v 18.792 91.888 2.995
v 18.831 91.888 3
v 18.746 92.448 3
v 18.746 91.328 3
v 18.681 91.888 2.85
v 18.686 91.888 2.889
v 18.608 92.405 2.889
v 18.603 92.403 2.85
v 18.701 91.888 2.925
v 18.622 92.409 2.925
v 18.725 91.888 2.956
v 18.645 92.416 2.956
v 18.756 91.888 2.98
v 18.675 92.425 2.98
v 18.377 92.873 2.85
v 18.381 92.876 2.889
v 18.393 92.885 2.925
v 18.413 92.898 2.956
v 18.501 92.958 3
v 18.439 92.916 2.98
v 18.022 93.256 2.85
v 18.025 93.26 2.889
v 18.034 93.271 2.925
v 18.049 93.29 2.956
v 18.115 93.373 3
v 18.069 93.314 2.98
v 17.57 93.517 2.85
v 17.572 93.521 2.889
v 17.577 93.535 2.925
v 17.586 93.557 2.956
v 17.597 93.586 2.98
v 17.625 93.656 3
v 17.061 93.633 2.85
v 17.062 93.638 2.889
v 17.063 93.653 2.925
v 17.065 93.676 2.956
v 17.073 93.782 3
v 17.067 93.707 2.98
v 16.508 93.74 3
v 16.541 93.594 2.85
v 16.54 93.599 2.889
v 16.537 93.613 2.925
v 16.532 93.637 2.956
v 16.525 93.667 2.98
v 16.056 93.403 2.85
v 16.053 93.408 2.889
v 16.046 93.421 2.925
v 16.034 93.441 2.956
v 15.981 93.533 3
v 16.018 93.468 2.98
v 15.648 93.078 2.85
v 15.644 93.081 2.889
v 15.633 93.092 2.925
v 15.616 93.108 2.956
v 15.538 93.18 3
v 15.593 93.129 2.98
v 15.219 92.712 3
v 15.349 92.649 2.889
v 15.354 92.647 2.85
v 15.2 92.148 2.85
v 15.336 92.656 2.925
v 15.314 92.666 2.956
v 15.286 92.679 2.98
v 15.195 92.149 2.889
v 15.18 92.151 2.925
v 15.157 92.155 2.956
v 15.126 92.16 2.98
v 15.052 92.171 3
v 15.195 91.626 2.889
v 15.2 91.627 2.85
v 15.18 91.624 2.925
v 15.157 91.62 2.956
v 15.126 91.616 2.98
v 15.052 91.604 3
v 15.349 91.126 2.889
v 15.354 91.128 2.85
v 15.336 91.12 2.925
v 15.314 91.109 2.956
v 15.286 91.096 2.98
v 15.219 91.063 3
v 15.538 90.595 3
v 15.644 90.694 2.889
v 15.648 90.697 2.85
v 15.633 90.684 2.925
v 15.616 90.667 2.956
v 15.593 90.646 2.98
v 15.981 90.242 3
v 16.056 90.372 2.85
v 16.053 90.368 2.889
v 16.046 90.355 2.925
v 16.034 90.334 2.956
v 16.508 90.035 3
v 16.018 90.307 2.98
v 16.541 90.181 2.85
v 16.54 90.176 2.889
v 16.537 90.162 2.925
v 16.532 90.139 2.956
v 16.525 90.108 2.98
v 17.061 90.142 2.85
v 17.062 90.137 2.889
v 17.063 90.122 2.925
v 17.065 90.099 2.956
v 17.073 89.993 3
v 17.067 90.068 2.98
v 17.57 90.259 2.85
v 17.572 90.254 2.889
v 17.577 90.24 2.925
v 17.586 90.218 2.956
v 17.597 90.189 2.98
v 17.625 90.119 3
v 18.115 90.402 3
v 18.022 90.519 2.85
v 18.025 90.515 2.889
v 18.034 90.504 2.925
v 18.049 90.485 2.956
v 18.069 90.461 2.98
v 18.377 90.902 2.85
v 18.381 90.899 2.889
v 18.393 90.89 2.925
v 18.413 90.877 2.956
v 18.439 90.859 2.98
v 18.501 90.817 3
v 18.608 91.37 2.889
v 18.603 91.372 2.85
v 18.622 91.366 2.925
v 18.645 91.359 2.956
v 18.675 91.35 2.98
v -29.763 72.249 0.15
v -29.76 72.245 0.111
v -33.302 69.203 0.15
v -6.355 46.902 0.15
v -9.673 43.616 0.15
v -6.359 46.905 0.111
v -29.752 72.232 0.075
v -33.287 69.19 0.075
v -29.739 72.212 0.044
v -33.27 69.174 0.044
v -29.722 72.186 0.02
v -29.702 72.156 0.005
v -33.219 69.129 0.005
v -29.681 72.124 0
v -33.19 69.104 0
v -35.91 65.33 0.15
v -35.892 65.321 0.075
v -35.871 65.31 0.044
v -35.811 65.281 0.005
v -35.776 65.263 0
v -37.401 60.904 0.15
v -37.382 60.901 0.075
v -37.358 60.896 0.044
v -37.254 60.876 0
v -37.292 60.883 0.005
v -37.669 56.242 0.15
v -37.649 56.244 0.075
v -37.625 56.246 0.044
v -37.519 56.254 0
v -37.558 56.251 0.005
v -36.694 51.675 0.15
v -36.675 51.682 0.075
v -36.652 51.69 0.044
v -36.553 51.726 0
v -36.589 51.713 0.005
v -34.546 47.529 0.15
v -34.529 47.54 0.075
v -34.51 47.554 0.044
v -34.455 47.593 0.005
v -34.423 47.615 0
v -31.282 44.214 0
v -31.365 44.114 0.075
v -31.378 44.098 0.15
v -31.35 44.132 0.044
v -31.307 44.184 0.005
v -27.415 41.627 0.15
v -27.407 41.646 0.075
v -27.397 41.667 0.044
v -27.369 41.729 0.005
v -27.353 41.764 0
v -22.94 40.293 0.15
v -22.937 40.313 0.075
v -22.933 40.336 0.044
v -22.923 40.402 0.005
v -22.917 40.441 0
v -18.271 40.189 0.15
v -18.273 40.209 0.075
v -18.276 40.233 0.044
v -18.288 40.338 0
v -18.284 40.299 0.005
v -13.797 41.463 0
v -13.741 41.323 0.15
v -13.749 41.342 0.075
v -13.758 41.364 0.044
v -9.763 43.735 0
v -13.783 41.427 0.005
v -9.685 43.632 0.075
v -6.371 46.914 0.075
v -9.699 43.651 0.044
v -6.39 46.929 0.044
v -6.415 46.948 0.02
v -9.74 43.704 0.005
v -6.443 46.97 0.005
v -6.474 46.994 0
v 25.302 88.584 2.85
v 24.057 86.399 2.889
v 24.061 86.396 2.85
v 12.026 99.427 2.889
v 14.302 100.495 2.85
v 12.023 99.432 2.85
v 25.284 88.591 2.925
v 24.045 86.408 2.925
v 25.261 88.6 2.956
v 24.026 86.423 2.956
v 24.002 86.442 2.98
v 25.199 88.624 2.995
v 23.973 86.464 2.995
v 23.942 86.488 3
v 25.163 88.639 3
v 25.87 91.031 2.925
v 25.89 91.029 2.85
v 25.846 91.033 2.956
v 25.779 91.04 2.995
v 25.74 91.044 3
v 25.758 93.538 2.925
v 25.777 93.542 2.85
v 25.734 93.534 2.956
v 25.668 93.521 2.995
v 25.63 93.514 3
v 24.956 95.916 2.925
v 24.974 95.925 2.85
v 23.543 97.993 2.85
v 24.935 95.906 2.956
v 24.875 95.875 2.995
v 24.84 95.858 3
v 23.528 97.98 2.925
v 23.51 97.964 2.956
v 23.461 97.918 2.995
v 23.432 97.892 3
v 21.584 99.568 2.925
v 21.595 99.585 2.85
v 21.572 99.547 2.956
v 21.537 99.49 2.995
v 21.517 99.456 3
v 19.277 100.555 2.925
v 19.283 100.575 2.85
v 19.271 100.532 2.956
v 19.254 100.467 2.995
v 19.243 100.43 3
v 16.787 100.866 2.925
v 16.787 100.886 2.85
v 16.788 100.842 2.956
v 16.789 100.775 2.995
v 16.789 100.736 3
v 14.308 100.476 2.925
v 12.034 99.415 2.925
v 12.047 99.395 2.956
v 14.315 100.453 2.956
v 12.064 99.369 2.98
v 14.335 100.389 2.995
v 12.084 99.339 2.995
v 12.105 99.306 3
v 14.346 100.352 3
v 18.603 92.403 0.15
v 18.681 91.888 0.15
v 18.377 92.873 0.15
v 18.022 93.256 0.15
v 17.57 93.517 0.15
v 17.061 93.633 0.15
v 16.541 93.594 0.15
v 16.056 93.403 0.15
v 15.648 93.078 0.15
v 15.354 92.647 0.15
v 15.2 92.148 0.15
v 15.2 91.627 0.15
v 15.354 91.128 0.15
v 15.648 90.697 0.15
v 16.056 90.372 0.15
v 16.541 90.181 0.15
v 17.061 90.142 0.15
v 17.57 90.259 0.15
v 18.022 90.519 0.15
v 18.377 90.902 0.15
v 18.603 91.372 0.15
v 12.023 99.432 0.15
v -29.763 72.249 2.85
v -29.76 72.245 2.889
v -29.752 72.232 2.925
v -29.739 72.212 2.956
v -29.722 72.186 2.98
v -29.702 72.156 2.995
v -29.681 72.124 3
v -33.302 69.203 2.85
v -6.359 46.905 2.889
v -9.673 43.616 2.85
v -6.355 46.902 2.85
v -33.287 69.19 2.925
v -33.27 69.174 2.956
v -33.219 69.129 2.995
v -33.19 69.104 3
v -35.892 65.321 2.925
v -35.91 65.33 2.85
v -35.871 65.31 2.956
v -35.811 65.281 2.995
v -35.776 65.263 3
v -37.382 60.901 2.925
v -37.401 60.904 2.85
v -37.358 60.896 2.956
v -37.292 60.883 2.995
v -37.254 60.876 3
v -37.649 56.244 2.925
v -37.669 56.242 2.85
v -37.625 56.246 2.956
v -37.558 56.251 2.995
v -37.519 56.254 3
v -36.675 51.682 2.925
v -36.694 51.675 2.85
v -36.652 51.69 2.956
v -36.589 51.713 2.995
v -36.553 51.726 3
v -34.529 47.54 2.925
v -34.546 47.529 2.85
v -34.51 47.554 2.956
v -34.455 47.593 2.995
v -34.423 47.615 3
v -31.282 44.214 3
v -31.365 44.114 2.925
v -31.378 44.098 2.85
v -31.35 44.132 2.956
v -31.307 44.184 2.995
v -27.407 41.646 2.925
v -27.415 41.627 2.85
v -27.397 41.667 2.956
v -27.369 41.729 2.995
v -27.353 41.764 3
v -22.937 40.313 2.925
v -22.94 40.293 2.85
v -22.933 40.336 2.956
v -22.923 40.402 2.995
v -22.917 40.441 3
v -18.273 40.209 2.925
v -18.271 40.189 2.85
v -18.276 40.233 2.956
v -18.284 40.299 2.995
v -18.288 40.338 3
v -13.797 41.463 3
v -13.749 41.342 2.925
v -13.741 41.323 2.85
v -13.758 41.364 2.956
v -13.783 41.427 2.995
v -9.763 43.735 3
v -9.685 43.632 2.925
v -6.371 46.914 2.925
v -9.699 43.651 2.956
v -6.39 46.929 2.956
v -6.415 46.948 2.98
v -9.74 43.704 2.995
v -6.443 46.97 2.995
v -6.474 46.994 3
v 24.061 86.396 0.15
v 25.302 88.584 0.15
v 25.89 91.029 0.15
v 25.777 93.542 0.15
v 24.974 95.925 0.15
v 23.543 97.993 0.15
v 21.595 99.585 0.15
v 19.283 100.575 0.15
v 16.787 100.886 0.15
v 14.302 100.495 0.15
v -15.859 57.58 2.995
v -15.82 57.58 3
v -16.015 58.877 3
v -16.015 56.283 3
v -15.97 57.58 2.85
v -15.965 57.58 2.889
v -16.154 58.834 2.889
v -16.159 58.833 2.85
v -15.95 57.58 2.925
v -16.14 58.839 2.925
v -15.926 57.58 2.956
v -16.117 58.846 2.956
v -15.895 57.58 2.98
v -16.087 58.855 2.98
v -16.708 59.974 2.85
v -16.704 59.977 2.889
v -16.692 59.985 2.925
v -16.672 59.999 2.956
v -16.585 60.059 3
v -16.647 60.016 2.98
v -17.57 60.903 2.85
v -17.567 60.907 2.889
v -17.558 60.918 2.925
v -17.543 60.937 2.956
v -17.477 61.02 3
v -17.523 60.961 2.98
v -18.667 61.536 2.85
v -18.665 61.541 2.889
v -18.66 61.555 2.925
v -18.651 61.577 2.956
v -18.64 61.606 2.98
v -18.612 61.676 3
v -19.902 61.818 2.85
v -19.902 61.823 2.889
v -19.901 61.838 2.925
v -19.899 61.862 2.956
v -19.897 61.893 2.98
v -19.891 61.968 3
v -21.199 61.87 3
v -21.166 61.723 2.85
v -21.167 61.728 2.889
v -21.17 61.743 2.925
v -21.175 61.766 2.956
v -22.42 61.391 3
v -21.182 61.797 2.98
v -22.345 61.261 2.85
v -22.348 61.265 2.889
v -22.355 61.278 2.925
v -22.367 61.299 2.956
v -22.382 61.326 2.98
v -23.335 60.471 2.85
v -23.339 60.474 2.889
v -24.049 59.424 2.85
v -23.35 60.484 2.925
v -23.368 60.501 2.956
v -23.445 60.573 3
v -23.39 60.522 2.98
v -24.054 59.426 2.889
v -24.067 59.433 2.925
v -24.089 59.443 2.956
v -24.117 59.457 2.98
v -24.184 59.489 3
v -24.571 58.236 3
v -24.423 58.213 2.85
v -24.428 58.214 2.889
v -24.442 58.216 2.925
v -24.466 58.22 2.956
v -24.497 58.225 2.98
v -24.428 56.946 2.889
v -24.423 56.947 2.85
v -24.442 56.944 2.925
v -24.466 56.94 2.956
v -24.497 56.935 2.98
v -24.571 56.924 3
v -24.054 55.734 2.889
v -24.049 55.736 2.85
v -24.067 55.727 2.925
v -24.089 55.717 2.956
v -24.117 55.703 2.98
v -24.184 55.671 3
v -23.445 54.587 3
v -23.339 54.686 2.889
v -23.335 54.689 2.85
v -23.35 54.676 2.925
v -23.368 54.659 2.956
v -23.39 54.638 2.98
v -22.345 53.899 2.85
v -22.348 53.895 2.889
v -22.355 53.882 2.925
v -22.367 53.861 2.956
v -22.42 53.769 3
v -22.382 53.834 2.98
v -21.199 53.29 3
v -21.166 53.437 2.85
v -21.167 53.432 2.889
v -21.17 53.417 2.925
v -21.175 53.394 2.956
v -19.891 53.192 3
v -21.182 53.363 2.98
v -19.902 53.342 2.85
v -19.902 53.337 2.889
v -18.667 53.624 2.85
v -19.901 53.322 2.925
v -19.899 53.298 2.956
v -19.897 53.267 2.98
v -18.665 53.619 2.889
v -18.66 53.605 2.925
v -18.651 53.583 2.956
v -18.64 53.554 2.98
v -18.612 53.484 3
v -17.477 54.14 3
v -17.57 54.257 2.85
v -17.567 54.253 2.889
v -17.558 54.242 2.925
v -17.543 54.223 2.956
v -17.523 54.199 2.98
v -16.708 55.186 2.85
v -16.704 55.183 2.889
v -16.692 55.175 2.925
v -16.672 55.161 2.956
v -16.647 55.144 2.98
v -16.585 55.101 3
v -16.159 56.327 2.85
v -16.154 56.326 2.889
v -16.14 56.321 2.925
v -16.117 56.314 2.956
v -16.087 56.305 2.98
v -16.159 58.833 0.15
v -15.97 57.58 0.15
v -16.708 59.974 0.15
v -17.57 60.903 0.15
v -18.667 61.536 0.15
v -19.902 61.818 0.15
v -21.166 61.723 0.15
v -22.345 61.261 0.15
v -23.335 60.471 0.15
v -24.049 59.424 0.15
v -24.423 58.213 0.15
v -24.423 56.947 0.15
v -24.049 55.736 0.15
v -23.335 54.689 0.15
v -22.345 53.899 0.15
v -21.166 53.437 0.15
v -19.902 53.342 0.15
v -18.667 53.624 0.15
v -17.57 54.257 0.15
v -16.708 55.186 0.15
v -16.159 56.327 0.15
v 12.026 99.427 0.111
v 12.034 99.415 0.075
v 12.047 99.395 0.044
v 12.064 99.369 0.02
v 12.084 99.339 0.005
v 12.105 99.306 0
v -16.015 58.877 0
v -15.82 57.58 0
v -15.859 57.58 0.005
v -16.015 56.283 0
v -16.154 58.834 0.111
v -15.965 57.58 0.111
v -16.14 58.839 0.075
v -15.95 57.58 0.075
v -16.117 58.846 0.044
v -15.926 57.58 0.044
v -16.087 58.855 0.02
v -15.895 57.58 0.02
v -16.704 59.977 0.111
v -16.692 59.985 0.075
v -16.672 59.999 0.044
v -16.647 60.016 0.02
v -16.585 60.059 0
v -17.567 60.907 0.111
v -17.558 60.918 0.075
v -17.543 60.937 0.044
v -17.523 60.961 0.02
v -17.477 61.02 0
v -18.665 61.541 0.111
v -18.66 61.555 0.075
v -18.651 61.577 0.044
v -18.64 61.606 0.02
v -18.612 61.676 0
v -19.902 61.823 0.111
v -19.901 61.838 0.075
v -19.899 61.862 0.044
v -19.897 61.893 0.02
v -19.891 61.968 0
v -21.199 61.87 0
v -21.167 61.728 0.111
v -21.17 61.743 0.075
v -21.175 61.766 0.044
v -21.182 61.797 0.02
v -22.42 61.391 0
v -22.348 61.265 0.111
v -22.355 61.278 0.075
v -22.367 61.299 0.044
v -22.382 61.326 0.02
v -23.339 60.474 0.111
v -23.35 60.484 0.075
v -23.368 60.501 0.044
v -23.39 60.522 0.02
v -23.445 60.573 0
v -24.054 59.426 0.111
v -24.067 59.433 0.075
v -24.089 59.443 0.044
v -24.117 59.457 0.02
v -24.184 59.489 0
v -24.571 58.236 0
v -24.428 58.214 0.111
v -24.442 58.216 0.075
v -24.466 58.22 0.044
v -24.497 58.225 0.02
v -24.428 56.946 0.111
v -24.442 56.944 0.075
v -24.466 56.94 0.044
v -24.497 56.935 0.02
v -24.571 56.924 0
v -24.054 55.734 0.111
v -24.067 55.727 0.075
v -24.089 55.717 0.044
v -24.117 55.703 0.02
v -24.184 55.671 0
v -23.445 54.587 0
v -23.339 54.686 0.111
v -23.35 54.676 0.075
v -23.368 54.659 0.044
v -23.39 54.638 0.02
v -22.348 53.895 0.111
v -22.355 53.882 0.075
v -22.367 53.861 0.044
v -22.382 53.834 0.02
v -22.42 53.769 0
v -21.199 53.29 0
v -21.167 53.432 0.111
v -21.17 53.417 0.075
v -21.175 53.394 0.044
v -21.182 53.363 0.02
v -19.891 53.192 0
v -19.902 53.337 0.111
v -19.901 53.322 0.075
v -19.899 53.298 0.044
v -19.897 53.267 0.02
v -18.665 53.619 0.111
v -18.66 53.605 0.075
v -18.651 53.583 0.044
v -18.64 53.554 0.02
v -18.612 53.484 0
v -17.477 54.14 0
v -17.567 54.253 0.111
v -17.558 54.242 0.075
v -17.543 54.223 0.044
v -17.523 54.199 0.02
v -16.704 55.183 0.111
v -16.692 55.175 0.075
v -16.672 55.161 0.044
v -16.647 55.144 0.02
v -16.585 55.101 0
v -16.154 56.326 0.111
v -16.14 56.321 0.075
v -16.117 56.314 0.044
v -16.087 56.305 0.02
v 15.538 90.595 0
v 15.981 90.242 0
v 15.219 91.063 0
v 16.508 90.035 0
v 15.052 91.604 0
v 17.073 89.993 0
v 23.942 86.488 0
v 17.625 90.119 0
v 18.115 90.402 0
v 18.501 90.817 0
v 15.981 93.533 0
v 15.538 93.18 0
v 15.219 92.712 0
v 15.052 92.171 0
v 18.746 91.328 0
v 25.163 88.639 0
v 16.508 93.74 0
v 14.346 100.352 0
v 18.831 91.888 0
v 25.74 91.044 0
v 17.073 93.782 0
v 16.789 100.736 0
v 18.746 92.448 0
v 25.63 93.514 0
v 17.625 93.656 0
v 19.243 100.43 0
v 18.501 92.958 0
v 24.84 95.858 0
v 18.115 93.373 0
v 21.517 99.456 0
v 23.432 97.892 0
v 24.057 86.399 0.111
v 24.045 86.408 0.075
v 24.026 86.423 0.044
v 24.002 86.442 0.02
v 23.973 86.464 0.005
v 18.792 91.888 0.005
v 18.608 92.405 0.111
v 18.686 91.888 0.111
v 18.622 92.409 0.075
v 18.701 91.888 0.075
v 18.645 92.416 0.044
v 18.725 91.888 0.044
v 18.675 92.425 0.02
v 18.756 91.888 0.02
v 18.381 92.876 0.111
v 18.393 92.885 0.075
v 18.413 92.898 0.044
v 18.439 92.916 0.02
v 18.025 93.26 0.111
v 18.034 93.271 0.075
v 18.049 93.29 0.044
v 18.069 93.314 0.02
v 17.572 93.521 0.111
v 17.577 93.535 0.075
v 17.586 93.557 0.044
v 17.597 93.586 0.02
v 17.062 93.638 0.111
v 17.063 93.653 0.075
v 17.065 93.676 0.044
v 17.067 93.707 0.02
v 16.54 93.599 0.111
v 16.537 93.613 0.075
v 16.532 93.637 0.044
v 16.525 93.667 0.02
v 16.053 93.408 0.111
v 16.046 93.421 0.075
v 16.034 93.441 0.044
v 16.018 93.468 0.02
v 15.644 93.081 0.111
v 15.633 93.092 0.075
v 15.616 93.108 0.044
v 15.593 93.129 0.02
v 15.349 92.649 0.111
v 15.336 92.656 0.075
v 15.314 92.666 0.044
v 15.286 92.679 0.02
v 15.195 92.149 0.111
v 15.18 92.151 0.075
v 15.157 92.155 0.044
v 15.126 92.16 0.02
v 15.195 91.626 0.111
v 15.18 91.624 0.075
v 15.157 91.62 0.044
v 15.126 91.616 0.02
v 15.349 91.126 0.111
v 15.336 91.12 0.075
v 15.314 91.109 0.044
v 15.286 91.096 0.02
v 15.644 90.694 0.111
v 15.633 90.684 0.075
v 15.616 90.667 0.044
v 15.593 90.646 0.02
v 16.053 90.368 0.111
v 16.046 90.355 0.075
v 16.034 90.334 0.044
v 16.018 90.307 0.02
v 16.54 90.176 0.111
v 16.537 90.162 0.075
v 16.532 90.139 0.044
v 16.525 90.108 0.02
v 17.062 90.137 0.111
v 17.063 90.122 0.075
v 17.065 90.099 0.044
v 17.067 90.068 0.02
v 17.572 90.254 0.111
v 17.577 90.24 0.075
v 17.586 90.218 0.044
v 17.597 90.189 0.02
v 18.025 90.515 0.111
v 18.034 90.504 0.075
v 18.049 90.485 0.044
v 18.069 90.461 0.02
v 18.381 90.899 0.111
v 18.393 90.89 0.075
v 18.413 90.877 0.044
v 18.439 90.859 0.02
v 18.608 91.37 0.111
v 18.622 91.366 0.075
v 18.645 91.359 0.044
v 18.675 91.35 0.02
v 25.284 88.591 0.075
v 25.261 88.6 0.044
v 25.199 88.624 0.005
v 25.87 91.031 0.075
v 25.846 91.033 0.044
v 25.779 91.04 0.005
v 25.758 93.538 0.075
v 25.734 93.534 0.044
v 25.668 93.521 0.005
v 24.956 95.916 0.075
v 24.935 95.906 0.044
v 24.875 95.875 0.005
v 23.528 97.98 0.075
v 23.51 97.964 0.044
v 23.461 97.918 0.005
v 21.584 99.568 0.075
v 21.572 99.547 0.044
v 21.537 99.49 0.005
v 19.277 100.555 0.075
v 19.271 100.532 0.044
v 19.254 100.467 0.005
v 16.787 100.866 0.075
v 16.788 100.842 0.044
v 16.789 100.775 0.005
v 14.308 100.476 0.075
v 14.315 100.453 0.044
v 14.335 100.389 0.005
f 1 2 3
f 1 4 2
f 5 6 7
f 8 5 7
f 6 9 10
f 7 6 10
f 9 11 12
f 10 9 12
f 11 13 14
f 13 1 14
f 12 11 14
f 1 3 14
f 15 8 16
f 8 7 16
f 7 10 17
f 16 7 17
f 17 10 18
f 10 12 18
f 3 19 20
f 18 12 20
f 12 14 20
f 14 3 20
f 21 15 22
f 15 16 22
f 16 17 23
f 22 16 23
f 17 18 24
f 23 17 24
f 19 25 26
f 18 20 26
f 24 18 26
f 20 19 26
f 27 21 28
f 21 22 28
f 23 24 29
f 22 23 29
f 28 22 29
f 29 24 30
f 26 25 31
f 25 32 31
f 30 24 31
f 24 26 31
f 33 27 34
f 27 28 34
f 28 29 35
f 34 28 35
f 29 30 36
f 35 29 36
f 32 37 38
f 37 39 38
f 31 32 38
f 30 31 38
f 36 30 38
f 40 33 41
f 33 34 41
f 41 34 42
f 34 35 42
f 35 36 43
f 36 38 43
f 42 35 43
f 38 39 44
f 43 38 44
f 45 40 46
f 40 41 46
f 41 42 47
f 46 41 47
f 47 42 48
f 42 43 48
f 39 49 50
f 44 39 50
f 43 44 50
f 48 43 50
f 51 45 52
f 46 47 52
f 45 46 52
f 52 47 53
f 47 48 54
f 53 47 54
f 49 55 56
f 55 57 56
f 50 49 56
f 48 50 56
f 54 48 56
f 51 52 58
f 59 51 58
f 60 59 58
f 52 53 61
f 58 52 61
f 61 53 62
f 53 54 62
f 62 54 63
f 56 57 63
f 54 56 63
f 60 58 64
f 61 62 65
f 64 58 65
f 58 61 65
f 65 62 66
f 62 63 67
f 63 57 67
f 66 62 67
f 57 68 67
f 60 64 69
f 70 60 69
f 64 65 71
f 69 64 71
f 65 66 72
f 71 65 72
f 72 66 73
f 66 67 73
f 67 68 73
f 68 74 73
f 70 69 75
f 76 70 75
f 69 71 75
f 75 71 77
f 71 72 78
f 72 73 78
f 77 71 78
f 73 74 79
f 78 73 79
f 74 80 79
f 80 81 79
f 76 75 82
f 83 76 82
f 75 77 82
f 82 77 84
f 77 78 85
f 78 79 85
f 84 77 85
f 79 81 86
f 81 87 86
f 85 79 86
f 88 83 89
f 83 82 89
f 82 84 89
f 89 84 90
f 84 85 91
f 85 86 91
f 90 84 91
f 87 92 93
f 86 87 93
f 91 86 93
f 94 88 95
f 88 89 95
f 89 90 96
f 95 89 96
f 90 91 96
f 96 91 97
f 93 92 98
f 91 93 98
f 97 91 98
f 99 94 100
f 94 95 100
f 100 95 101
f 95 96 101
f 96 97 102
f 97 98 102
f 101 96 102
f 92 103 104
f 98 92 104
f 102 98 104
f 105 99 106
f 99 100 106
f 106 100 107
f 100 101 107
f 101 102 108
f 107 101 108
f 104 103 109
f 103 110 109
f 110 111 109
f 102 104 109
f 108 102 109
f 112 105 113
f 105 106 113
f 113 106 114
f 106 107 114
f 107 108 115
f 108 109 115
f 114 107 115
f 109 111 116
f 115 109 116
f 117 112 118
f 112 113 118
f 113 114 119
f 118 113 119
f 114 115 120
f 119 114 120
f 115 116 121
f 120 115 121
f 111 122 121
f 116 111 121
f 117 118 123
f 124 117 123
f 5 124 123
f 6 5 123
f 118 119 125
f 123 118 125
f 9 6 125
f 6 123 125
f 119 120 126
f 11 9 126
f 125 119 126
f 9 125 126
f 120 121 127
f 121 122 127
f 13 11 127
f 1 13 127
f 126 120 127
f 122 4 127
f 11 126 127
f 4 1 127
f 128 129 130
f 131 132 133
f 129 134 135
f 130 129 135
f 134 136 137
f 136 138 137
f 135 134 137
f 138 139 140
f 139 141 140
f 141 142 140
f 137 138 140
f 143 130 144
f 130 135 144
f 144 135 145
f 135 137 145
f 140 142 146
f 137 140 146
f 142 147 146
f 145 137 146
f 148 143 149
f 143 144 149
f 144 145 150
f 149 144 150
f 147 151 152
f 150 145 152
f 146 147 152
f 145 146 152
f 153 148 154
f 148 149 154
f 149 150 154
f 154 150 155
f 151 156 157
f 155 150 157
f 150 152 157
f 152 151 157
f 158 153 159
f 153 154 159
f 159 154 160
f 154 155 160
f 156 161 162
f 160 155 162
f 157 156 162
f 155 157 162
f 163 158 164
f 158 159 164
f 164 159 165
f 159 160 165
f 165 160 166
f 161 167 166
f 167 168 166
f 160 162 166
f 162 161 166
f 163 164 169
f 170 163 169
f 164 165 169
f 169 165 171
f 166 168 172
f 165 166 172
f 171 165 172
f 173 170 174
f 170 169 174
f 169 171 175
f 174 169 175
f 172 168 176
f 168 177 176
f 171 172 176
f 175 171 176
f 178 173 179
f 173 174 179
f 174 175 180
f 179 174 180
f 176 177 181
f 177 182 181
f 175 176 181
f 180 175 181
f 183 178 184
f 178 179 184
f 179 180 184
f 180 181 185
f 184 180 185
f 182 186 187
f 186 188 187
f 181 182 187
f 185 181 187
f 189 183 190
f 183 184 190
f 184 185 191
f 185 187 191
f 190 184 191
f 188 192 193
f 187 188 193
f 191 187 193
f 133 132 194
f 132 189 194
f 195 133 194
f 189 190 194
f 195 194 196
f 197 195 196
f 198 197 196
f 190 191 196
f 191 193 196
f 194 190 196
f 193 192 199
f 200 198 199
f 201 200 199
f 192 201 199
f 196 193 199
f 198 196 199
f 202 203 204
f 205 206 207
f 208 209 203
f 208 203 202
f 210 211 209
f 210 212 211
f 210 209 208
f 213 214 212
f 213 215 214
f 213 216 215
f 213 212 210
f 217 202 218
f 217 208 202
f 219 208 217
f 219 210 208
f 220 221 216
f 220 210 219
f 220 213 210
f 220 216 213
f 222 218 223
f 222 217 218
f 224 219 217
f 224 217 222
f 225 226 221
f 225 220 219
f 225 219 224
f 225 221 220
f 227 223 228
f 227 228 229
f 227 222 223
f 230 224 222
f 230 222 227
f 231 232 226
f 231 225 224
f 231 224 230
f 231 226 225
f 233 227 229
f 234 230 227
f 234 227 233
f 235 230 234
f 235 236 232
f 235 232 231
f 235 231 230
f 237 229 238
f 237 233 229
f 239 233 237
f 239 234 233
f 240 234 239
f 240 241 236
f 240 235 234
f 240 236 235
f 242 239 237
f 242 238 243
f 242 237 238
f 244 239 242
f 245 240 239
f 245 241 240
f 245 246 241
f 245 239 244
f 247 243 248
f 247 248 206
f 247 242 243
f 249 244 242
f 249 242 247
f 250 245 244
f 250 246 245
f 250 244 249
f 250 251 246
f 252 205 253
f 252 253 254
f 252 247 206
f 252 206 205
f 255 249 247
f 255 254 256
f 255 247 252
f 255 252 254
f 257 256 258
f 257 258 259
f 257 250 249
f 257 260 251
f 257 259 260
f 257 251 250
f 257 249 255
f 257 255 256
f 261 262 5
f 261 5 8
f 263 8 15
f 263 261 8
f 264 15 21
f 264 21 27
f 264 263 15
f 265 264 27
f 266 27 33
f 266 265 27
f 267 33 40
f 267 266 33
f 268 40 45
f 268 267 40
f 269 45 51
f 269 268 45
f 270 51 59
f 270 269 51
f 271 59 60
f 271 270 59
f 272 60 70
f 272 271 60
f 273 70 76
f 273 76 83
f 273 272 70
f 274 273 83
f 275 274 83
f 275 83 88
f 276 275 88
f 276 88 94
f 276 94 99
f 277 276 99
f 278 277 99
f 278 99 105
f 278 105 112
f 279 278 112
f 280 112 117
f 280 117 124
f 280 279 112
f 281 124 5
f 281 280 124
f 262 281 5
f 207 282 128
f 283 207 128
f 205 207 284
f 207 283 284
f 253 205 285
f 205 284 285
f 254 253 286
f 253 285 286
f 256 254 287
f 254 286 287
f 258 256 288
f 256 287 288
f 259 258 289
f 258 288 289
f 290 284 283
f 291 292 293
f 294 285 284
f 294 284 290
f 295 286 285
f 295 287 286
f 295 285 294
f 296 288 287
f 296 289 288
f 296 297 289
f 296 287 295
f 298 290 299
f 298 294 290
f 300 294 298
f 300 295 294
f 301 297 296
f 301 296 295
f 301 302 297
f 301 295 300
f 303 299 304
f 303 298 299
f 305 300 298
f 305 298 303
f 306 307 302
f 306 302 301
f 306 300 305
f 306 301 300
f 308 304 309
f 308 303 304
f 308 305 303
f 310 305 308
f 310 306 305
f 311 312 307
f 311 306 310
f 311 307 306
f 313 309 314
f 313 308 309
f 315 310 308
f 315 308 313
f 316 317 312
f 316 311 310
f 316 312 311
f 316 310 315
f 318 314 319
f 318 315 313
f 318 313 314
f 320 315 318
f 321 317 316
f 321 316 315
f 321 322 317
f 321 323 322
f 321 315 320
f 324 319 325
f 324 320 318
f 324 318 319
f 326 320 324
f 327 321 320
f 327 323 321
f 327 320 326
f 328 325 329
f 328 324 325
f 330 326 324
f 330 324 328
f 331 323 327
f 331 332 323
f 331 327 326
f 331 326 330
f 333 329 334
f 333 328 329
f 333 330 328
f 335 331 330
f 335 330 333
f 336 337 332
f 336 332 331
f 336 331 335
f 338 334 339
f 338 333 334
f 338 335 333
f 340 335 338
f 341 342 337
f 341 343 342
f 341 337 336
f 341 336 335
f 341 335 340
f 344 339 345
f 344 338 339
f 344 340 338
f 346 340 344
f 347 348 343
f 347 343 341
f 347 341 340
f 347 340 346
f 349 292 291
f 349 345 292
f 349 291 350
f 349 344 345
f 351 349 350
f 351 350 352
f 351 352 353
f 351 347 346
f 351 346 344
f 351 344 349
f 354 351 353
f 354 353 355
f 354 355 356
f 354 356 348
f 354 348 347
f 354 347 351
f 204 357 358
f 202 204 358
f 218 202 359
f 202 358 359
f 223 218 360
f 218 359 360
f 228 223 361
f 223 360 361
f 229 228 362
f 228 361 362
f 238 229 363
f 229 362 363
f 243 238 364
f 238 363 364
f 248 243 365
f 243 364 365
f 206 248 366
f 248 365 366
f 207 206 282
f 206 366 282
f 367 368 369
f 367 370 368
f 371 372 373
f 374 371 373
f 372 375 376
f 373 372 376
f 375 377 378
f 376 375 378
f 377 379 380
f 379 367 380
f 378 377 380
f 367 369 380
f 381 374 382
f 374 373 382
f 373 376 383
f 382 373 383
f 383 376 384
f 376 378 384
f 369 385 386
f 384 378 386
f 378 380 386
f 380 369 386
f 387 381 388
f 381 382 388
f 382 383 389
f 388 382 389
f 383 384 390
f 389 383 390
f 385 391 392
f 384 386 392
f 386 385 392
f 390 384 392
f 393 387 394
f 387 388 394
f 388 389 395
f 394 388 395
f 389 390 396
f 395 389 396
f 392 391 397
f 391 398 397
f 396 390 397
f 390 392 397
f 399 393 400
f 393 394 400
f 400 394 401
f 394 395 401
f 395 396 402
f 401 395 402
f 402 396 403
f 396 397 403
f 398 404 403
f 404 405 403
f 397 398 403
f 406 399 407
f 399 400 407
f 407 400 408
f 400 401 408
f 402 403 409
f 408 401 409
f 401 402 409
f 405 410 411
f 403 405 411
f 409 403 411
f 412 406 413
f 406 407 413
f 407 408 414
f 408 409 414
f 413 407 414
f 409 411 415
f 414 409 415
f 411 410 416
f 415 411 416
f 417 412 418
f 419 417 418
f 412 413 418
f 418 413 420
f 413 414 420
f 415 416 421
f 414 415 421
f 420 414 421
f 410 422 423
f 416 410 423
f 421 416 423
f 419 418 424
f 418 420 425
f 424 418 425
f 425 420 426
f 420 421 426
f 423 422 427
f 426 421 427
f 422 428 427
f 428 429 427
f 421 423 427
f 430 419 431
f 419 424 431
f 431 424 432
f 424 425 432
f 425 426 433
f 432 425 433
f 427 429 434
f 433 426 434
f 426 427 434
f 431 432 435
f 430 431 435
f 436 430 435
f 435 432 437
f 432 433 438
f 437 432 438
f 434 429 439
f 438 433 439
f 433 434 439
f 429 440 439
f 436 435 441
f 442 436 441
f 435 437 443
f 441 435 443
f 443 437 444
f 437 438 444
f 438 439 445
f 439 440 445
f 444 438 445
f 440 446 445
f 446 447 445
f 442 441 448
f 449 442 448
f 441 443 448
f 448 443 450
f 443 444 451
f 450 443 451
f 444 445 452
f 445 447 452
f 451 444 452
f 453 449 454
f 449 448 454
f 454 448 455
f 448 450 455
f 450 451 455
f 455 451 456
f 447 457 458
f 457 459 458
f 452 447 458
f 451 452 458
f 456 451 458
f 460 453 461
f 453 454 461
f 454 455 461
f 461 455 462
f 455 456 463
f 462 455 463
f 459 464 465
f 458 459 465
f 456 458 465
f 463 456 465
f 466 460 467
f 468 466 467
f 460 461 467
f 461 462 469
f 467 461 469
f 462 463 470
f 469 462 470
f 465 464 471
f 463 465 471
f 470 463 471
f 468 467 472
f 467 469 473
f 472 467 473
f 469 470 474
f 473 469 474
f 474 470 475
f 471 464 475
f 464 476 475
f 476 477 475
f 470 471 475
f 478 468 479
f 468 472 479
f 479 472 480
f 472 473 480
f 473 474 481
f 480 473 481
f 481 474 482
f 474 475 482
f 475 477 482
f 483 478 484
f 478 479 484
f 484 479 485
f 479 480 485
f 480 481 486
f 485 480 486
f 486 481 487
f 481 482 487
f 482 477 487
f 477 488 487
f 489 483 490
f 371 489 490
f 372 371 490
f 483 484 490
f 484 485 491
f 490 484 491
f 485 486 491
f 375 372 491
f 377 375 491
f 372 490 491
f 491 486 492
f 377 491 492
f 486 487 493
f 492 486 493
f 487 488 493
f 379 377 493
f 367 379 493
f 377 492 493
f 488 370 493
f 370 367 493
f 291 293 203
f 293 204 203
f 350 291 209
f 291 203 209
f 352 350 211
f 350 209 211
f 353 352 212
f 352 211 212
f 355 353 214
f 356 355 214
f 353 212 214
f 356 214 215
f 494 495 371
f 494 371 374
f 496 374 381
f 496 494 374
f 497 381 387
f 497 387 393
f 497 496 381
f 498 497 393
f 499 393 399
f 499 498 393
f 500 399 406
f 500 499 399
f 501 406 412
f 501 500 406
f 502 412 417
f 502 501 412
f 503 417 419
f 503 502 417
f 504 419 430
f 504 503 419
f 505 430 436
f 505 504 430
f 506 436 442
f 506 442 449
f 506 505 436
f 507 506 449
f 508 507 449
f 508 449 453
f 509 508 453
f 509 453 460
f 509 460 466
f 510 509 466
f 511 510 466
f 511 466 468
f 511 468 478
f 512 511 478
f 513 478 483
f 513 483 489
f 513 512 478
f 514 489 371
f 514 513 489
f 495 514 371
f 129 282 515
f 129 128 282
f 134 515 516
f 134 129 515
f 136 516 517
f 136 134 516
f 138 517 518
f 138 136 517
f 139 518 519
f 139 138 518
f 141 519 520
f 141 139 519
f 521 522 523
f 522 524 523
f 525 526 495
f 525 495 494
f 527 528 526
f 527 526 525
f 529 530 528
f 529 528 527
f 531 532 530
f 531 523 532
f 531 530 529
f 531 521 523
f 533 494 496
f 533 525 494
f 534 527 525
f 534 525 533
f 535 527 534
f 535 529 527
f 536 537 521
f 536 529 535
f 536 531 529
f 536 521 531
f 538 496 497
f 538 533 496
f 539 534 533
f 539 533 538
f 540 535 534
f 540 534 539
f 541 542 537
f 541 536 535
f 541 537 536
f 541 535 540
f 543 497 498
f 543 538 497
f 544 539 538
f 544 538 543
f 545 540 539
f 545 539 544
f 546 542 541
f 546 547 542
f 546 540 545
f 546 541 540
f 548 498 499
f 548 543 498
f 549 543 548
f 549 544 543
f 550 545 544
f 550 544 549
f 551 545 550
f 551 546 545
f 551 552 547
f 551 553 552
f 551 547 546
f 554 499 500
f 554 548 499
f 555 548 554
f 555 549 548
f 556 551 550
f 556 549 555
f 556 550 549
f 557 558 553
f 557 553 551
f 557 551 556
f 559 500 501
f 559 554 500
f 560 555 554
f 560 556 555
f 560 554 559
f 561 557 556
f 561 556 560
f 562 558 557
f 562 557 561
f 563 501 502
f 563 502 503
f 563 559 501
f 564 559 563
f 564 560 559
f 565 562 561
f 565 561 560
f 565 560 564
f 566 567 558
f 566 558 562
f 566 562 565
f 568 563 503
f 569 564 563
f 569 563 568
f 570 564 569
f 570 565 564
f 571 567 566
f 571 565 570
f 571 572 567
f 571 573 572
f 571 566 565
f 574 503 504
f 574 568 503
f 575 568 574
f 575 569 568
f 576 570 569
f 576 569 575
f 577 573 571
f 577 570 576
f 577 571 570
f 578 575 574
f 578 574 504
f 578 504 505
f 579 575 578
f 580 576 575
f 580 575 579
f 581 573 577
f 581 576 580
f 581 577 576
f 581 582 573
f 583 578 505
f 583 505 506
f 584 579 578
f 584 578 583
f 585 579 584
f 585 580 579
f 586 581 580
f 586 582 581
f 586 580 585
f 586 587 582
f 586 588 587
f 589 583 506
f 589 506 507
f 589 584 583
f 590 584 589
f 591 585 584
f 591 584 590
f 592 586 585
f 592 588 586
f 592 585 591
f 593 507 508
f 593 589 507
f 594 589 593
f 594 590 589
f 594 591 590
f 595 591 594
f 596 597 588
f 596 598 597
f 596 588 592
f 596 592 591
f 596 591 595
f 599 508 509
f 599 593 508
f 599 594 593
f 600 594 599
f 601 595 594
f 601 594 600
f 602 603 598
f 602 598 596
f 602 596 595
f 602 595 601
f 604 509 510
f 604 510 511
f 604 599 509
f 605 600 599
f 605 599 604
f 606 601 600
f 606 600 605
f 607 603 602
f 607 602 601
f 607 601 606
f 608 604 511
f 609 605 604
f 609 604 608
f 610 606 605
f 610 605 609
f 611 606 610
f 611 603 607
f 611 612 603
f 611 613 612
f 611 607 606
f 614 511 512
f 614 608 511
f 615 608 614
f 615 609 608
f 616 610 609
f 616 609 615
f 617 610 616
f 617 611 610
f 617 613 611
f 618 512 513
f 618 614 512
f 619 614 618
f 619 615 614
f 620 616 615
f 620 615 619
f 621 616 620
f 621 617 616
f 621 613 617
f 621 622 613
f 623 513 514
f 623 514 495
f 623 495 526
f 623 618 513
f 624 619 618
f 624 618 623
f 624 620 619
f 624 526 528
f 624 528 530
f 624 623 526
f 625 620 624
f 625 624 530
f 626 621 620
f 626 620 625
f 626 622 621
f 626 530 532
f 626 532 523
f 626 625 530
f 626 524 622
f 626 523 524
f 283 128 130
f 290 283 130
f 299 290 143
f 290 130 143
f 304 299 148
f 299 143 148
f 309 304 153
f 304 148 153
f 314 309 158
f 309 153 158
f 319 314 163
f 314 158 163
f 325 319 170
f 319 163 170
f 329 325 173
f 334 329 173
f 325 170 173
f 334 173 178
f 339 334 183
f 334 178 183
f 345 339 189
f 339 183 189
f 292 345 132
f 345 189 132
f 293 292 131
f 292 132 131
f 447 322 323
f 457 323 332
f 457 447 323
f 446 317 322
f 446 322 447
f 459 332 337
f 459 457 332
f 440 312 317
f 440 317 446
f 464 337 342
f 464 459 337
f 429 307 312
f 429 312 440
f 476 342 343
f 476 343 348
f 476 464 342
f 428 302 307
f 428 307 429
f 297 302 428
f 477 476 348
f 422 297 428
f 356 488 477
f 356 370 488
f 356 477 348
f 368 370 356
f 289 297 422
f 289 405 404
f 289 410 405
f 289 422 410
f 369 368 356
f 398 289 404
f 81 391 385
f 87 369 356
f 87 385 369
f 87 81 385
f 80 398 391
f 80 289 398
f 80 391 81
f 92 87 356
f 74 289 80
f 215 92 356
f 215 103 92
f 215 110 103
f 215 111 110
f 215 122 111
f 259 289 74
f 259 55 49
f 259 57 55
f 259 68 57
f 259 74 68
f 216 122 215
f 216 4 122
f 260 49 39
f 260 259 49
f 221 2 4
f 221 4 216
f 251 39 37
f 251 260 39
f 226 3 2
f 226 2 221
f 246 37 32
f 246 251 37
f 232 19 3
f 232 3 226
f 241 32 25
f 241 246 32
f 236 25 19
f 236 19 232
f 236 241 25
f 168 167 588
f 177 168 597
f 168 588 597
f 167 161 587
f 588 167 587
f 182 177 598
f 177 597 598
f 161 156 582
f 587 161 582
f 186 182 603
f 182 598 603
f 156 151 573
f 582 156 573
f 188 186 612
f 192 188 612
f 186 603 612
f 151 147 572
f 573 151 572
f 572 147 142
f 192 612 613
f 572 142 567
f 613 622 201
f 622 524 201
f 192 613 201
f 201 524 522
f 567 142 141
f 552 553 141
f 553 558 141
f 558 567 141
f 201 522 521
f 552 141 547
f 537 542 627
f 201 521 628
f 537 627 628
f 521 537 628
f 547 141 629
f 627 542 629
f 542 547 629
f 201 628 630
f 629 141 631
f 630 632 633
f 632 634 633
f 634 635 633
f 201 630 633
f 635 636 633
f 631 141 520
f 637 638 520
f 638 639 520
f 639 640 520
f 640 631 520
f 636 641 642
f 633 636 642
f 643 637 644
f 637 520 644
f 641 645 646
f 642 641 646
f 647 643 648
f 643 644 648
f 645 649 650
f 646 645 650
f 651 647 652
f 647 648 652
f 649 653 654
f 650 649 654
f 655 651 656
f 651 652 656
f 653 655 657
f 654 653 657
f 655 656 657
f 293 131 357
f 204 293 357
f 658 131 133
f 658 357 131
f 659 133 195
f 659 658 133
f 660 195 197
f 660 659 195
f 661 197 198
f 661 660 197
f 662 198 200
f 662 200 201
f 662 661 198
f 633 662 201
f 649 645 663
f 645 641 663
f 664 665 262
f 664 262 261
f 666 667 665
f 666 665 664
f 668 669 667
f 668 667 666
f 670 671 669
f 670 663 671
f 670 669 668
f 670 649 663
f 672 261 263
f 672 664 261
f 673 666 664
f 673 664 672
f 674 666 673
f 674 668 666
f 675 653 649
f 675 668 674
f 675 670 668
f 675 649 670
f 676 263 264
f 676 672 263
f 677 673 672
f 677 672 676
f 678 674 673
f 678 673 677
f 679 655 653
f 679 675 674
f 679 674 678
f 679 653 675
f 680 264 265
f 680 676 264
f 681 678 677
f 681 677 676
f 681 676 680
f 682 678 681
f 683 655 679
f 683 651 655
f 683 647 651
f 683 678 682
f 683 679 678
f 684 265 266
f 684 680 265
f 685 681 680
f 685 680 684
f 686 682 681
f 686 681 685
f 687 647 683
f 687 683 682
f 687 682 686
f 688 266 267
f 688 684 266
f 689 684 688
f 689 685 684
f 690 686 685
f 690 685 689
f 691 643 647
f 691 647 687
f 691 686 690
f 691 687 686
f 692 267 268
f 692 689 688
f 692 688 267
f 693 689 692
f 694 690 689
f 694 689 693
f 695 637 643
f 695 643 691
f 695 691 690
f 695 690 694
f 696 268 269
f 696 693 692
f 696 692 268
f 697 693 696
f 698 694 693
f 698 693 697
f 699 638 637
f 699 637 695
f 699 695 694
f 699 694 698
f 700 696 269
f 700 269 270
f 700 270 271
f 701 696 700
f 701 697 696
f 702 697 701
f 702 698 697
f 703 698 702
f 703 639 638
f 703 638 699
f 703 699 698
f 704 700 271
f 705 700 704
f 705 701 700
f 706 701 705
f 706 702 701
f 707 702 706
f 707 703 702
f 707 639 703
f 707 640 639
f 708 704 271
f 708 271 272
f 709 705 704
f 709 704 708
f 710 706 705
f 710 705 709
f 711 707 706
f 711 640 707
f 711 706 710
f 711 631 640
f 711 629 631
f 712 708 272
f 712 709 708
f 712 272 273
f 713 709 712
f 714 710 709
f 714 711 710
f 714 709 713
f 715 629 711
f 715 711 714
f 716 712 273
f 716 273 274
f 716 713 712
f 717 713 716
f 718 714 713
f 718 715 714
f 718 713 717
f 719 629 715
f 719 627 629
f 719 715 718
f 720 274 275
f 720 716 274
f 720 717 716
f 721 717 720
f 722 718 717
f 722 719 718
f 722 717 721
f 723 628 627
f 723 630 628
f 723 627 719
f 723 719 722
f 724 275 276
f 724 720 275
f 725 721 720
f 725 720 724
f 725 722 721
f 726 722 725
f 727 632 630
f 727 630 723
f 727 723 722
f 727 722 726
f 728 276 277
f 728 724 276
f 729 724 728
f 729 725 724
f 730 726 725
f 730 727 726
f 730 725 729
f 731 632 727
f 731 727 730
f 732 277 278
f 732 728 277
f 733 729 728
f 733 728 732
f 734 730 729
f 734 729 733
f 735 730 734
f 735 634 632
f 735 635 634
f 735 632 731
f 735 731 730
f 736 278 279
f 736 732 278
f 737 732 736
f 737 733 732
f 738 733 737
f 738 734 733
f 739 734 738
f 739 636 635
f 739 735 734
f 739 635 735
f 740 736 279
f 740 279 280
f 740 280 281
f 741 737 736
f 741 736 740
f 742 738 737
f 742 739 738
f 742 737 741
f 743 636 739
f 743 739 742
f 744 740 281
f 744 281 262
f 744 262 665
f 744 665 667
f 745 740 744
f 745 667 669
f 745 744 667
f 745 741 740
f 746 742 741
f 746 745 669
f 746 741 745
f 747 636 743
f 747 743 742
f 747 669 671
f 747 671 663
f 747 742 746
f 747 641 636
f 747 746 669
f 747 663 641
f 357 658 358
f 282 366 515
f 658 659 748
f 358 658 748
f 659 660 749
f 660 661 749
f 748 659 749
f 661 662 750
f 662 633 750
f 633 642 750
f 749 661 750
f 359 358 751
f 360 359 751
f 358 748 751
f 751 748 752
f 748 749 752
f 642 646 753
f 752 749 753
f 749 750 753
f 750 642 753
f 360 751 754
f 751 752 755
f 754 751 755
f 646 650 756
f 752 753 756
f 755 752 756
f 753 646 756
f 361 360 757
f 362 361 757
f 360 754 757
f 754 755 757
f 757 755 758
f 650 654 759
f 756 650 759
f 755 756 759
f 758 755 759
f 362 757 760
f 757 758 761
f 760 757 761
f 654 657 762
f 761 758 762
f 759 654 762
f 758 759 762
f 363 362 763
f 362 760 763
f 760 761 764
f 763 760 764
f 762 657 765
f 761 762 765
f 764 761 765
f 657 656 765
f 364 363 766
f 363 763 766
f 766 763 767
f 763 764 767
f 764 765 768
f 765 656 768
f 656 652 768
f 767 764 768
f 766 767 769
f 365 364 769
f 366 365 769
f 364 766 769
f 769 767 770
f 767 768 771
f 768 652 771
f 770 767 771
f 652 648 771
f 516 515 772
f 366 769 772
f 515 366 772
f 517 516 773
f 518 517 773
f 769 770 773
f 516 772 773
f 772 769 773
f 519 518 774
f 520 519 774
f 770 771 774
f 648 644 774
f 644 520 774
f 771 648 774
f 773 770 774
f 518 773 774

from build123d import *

# Parameters (mm, degrees)
SKETCH1_R           = 4.25
SKETCH1_R_2         = 1.75
BOSS_EXTRUDE1_DEPTH = 3
FILLET2_R           = 0.15


with BuildPart() as part:
    # Sketch1 → Boss-Extrude1 (new body)
    with BuildSketch(Plane.XY):
        with BuildLine():
            Line((-6.355257907, 46.902035461), (24.061140419, 86.396034215))
            ThreePointArc((24.061140419, 86.396034215), (23.542637098, 97.993482955), (12.023043472, 99.431754711))
            Line((12.023043472, 99.431754711), (-29.762668638, 72.249269759))
            ThreePointArc((-29.762668638, 72.249269759), (-33.07654119, 45.707369768), (-6.355257907, 46.902035461))
        make_face()
        with Locations((-20.22, 57.58)):
            Circle(SKETCH1_R, mode=Mode.SUBTRACT)
        with Locations((16.930701629, 91.887558835)):
            Circle(SKETCH1_R_2, mode=Mode.SUBTRACT)
    extrude(amount=BOSS_EXTRUDE1_DEPTH)

    # Fillet2
    fillet2_edges = [part.edges().sort_by_distance(p)[0] for p in [
        (15.180701629, 91.887558835, 0),
        (-24.47, 57.58, 3),
        (23.542637098, 97.993482955, 3),
        (-8.869812583, 85.840512235, 3),
        (-33.07654119, 45.707369768, 3),
        (8.852941256, 66.649034838, 3),
        (15.180701629, 91.887558835, 3),
        (8.852941256, 66.649034838, 0),
        (-33.07654119, 45.707369768, 0),
        (-8.869812583, 85.840512235, 0),
        (23.542637098, 97.993482955, 0),
        (-24.47, 57.58, 0),
    ]]
    fillet(fillet2_edges, radius=FILLET2_R)


solid = part.part
